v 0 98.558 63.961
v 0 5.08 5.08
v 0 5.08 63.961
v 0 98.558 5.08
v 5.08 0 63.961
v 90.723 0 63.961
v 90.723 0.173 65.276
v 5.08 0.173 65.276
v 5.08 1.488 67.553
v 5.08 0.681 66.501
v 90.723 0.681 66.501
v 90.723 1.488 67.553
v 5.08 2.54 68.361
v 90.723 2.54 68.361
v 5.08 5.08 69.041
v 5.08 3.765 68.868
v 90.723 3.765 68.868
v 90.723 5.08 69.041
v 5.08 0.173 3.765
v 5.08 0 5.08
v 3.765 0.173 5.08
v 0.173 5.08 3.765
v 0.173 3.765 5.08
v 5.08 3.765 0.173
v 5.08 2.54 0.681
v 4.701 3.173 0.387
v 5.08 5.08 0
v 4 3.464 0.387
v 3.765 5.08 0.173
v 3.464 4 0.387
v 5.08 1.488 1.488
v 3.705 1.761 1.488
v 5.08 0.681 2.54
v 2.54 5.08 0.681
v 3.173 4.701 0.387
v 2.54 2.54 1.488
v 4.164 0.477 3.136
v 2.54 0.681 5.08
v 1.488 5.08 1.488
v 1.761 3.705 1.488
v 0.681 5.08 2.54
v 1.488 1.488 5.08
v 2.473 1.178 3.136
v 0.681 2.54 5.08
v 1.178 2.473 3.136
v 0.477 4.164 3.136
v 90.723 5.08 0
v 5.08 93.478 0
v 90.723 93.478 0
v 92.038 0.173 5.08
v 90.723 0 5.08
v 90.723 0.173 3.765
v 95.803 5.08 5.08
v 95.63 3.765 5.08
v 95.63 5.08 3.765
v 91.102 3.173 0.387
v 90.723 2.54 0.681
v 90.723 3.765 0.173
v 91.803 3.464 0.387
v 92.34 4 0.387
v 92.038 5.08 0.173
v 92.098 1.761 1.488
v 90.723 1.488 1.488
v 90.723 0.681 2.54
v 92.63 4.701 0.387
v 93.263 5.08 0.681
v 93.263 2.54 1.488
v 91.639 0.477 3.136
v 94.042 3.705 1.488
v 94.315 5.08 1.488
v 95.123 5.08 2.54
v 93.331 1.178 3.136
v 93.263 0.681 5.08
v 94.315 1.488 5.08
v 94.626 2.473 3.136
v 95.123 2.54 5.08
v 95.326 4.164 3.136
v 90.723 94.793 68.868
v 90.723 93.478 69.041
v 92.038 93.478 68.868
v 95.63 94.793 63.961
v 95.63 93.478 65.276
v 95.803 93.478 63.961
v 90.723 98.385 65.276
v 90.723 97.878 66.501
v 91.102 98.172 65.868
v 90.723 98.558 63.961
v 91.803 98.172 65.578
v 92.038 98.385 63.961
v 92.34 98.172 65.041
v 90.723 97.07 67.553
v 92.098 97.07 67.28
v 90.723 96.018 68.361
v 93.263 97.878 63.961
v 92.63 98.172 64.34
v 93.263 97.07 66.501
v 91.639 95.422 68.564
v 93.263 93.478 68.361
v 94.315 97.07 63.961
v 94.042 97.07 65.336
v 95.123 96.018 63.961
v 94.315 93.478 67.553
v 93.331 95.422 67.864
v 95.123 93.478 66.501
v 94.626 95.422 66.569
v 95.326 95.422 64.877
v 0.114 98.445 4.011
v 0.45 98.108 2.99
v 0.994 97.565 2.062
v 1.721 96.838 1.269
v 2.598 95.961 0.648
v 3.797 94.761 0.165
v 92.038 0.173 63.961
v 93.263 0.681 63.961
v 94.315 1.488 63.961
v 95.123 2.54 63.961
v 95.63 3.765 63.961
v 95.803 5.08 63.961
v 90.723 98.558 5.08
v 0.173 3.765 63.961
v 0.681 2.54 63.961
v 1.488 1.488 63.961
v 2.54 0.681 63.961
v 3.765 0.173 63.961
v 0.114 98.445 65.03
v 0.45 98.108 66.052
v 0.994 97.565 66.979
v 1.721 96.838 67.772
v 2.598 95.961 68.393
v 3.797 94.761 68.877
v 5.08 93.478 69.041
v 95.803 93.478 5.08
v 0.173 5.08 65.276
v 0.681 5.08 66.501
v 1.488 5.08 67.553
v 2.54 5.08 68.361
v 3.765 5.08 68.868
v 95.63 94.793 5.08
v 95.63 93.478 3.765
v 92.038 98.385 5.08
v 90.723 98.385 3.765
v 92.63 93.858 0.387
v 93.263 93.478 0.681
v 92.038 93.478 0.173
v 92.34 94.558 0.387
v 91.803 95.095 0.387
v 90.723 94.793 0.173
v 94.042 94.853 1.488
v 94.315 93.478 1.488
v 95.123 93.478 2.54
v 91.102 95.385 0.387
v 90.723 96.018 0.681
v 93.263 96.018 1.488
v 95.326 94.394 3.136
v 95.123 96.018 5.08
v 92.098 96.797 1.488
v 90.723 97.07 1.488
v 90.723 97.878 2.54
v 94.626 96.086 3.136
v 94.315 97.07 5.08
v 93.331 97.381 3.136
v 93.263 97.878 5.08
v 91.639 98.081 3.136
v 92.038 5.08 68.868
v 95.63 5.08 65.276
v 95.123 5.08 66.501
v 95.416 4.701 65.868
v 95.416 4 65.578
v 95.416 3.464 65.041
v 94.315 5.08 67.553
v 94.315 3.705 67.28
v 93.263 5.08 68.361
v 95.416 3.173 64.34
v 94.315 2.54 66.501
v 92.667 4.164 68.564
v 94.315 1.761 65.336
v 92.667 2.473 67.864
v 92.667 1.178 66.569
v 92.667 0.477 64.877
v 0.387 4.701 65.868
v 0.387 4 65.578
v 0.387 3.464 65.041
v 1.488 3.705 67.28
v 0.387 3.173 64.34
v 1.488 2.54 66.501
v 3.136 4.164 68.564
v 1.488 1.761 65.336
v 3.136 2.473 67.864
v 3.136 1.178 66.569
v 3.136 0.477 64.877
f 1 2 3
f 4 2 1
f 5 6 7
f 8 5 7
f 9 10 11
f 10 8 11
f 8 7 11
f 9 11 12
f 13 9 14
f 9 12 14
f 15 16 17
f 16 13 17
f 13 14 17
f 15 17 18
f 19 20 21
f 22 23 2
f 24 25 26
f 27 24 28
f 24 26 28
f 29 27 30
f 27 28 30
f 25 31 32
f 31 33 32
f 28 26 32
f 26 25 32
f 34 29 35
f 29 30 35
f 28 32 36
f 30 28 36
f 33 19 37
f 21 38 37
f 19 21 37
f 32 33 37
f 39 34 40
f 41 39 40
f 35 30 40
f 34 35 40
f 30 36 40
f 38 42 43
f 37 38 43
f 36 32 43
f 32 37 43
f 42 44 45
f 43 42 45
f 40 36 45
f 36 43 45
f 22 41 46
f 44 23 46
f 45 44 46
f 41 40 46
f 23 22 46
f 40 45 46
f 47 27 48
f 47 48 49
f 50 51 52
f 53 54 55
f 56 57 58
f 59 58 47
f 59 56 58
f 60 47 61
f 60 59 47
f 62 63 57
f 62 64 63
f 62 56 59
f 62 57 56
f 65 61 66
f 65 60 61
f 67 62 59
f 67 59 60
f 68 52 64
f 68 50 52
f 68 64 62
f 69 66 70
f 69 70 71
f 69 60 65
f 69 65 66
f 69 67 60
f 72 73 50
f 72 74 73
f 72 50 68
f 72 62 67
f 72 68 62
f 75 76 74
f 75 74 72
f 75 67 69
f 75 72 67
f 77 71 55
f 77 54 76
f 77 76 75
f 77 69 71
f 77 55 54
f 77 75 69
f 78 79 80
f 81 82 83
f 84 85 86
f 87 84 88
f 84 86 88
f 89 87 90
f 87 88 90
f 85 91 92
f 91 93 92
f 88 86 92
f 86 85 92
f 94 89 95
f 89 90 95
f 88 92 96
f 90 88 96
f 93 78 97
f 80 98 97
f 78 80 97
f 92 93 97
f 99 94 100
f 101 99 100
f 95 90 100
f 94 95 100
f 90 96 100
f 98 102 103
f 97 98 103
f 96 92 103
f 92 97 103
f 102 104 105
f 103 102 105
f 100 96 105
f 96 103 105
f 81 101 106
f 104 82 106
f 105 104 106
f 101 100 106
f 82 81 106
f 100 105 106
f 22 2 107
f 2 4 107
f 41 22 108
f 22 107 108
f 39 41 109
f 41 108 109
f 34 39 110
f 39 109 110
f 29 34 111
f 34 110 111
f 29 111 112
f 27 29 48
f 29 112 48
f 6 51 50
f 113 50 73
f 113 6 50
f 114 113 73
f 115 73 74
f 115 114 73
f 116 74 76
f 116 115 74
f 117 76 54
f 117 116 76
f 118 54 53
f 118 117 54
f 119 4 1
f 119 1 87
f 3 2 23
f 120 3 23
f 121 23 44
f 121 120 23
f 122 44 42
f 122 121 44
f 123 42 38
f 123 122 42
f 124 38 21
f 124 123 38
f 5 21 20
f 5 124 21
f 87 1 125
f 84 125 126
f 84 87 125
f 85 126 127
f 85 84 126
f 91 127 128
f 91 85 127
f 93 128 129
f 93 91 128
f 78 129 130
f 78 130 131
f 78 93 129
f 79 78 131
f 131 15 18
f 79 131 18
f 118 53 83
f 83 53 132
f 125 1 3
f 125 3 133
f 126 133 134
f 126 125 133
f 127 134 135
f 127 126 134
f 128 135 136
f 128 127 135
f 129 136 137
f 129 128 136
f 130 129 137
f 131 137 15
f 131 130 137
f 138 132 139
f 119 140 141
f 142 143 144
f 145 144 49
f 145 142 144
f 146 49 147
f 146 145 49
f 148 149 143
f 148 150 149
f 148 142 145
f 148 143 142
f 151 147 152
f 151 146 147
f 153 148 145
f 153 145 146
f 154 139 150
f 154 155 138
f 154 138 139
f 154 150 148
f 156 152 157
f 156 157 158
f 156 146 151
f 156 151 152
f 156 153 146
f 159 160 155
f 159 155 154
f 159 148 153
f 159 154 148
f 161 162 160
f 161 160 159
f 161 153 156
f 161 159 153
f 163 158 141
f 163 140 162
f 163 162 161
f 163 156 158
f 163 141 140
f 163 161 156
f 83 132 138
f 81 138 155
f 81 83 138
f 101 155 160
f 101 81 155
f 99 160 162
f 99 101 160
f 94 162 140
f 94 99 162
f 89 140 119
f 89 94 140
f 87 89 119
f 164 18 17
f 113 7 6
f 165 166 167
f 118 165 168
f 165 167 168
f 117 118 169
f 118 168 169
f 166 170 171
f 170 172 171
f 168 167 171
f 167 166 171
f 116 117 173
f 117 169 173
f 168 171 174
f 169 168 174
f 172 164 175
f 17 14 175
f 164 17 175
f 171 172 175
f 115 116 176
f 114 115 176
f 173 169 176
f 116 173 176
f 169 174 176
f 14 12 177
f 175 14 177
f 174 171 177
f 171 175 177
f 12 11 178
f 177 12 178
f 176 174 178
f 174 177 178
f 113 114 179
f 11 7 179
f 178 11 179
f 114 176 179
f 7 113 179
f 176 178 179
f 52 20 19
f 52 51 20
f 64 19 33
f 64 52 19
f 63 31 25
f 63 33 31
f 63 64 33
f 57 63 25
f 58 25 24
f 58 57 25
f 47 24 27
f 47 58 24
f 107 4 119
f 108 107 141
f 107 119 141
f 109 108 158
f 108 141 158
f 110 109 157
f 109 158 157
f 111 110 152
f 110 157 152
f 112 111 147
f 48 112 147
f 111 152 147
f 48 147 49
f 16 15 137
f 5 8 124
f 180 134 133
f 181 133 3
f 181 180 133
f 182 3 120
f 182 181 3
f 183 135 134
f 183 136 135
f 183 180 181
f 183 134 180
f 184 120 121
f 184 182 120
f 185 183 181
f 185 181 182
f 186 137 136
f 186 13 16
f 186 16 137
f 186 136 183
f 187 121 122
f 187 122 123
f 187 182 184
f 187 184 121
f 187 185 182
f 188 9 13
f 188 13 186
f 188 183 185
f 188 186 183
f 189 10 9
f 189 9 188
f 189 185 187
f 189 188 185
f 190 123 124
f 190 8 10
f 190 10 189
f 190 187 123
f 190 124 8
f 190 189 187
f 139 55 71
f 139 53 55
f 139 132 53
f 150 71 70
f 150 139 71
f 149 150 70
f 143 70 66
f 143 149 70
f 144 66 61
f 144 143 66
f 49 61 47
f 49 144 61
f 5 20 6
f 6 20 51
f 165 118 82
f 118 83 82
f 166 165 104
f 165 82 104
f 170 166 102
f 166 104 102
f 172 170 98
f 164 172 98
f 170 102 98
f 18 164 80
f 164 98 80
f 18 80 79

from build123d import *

# Parameters (mm, degrees)
F0_W     = 95.803171
F0_H     = 98.558307
F1_DEPTH = 69.041213
F2_R     = 5.08


with BuildPart() as f1:
    # F0 (on Top) → F1 (new body)
    with BuildSketch(Plane.XY):
        with Locations((47.901585, 49.279153)):
            Rectangle(F0_W, F0_H)
    extrude(amount=F1_DEPTH)

    # F2
    f2_edges = [f1.edges().sort_by_distance(p)[0] for p in [
        (47.901586, 0, 69.041213),
        (95.803171, 49.279153, 69.041213),
        (47.901586, 98.558307, 69.041213),
        (0, 49.279153, 69.041213),
        (95.803171, 0, 34.520607),
        (0, 0, 34.520607),
        (95.803171, 98.558307, 34.520607),
        (47.901586, 0, 0),
        (95.803171, 49.279153, 0),
        (47.901586, 98.558307, 0),
        (0, 49.279153, 0),
    ]]
    fillet(f2_edges, radius=F2_R)


solid = f1.part
